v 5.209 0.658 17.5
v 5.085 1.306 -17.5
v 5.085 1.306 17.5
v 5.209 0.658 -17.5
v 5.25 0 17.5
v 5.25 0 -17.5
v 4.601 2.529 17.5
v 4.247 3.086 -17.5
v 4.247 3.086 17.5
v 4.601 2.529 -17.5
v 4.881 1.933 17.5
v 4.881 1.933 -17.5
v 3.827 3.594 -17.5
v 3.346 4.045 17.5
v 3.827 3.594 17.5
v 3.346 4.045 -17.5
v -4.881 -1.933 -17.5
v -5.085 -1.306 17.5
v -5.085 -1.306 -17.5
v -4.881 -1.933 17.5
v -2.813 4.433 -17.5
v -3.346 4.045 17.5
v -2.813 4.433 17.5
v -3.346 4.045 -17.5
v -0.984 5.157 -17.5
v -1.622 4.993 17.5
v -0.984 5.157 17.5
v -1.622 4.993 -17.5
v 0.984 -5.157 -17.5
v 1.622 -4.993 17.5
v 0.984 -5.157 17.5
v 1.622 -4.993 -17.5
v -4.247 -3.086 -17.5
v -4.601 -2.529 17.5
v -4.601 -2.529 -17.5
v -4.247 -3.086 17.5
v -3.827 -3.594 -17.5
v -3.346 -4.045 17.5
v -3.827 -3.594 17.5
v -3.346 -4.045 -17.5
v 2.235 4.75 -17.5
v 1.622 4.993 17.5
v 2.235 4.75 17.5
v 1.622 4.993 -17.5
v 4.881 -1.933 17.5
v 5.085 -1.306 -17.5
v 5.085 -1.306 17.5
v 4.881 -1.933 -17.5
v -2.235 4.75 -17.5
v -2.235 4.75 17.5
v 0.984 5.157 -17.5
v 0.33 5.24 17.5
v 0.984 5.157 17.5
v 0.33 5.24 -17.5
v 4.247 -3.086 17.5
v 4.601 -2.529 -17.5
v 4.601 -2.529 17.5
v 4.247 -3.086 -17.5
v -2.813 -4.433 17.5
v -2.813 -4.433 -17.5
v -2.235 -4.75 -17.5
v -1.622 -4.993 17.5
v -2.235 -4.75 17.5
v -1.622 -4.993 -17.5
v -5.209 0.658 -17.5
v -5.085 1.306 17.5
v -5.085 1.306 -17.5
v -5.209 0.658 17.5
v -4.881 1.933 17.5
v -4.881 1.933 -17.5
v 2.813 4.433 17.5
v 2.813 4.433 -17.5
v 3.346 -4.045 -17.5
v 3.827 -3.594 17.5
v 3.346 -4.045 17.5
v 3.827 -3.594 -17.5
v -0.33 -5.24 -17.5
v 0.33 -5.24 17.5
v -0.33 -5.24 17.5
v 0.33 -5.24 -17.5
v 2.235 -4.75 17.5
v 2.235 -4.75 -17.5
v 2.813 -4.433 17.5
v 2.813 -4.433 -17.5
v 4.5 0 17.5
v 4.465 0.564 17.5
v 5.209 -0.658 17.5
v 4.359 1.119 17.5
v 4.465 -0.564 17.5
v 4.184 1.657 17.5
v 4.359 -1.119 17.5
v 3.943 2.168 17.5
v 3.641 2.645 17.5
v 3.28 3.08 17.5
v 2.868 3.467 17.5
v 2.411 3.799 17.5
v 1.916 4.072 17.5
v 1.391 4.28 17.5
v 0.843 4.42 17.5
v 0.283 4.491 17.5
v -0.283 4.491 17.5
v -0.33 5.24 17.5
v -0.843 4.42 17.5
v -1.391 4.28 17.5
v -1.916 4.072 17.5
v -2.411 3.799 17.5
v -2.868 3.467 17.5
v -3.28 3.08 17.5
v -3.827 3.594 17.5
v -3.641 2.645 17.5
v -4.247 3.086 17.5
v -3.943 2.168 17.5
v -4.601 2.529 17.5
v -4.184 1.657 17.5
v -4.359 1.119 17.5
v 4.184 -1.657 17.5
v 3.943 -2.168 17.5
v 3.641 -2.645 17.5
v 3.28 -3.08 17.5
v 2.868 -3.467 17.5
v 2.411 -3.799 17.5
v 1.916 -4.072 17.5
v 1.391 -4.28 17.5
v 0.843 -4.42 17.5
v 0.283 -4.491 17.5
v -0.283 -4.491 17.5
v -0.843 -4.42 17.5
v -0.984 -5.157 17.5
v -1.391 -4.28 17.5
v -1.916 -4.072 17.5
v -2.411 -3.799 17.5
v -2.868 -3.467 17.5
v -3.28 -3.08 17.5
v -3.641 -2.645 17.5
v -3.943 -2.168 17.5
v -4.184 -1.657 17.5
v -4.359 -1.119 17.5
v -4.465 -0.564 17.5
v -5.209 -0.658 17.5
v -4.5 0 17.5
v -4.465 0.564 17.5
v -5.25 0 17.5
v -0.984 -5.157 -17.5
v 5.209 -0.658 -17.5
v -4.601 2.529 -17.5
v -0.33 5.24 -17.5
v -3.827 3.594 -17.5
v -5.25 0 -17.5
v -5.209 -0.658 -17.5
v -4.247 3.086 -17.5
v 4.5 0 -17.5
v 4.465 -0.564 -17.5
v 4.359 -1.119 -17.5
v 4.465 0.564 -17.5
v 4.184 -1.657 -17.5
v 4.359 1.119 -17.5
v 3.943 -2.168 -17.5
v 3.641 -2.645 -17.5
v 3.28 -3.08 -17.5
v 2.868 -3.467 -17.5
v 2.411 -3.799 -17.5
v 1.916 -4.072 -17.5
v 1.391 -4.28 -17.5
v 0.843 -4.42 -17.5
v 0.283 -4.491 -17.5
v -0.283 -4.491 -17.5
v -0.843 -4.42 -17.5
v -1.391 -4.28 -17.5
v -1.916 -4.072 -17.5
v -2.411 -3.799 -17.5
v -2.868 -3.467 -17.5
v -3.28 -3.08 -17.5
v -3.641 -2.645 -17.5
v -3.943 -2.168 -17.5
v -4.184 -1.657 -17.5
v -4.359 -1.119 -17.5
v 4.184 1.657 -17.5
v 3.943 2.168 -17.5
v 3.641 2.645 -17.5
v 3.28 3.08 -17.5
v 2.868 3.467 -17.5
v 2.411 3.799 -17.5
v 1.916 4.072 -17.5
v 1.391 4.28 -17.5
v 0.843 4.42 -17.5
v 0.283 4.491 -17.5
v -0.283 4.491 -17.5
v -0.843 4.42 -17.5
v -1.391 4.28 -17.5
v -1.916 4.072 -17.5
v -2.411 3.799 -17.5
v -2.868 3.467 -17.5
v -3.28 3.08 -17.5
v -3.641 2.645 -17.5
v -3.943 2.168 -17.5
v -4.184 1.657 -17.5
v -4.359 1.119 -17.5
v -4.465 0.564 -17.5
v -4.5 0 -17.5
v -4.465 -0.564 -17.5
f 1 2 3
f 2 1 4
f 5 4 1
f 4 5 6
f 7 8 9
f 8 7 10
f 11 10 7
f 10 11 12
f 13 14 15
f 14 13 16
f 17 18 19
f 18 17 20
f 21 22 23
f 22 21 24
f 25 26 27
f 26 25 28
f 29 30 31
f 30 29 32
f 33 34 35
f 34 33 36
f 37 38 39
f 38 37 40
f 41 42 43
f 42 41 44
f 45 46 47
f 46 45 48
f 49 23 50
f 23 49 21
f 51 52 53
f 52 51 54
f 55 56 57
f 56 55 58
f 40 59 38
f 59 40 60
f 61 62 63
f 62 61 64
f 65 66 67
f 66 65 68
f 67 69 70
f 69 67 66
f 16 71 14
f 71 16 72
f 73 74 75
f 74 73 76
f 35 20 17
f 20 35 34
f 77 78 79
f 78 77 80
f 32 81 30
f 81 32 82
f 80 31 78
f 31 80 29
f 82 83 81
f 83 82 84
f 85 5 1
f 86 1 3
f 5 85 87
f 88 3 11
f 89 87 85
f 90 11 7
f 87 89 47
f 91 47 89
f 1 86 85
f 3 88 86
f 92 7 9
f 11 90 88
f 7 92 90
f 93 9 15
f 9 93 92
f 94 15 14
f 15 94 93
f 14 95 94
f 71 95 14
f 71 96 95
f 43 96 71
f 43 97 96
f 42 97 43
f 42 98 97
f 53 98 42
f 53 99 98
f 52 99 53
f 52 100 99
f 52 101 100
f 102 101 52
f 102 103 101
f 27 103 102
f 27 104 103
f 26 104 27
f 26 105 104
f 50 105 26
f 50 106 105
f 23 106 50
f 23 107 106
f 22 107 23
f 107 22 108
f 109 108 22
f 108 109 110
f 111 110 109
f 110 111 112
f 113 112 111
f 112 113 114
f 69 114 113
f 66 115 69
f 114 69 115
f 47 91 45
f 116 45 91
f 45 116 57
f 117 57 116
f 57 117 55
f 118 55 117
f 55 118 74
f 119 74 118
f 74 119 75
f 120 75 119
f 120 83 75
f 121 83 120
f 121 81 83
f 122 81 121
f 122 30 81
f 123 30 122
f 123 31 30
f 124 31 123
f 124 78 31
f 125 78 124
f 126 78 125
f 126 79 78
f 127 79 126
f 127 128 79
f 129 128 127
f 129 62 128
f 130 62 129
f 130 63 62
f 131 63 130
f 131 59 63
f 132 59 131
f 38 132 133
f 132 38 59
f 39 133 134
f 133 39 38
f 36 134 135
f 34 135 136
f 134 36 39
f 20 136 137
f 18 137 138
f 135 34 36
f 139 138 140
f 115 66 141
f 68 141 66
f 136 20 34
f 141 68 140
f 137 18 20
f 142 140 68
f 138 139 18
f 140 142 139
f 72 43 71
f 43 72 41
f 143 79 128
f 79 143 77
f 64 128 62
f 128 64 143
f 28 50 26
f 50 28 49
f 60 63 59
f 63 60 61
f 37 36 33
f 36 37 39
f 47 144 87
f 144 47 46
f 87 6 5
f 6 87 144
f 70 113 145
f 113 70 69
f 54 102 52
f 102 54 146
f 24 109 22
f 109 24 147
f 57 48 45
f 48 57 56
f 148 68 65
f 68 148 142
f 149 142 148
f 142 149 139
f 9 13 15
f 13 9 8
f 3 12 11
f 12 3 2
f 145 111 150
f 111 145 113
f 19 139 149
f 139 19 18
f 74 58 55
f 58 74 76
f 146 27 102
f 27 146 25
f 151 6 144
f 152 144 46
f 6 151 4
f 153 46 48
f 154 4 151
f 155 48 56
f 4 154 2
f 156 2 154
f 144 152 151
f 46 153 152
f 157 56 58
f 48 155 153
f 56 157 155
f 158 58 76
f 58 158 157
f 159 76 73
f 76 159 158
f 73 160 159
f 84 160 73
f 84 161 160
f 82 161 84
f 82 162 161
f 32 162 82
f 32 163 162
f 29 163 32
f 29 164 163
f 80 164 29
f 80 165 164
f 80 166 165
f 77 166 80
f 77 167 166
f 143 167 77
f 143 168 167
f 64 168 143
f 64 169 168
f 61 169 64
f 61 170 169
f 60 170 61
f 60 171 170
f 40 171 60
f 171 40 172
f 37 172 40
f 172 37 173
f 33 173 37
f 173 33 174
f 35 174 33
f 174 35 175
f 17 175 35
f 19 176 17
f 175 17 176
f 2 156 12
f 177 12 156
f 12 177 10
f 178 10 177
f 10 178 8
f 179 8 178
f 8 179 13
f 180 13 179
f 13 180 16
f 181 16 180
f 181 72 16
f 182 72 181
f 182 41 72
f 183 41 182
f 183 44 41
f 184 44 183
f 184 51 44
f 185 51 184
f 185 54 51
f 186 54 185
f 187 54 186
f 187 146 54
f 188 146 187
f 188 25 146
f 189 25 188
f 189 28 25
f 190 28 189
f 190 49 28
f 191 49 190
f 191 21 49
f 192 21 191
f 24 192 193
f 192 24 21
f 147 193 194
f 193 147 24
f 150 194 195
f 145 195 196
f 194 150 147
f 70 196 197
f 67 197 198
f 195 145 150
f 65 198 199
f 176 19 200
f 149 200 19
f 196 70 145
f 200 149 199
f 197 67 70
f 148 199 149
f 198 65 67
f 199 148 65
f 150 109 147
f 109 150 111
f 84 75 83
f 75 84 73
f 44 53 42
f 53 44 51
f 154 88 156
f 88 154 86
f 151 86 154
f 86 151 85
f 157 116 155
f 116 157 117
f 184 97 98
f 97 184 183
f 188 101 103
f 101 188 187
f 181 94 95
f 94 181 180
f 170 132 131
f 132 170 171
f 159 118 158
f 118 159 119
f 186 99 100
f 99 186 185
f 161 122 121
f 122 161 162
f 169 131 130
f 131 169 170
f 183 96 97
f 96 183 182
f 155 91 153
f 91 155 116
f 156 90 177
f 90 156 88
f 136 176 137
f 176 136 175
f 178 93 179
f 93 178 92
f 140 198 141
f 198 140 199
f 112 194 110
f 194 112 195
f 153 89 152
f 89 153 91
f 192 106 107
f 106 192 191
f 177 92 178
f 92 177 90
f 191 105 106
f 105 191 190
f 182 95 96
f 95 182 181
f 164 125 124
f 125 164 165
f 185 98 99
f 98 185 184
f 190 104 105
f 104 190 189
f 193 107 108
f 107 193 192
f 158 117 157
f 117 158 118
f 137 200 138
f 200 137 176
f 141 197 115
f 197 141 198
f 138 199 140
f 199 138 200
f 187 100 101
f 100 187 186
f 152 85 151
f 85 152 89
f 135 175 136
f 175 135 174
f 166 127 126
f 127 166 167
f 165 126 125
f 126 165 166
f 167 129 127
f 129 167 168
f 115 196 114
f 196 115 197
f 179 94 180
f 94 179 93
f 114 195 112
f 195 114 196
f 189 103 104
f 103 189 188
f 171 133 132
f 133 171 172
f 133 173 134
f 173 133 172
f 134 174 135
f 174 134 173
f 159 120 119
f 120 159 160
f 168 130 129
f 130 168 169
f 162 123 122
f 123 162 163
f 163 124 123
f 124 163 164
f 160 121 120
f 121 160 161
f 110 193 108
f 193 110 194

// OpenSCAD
$fn = 50;


difference() {
	union() {
		translate(v = [0, 0, -17.5000000000]) {
			cylinder(h = 35, r = 5.2500000000);
		}
	}
	union() {
		translate(v = [0, 0, -100.0000000000]) {
			cylinder(h = 200, r = 4.5000000000);
		}
	}
}
